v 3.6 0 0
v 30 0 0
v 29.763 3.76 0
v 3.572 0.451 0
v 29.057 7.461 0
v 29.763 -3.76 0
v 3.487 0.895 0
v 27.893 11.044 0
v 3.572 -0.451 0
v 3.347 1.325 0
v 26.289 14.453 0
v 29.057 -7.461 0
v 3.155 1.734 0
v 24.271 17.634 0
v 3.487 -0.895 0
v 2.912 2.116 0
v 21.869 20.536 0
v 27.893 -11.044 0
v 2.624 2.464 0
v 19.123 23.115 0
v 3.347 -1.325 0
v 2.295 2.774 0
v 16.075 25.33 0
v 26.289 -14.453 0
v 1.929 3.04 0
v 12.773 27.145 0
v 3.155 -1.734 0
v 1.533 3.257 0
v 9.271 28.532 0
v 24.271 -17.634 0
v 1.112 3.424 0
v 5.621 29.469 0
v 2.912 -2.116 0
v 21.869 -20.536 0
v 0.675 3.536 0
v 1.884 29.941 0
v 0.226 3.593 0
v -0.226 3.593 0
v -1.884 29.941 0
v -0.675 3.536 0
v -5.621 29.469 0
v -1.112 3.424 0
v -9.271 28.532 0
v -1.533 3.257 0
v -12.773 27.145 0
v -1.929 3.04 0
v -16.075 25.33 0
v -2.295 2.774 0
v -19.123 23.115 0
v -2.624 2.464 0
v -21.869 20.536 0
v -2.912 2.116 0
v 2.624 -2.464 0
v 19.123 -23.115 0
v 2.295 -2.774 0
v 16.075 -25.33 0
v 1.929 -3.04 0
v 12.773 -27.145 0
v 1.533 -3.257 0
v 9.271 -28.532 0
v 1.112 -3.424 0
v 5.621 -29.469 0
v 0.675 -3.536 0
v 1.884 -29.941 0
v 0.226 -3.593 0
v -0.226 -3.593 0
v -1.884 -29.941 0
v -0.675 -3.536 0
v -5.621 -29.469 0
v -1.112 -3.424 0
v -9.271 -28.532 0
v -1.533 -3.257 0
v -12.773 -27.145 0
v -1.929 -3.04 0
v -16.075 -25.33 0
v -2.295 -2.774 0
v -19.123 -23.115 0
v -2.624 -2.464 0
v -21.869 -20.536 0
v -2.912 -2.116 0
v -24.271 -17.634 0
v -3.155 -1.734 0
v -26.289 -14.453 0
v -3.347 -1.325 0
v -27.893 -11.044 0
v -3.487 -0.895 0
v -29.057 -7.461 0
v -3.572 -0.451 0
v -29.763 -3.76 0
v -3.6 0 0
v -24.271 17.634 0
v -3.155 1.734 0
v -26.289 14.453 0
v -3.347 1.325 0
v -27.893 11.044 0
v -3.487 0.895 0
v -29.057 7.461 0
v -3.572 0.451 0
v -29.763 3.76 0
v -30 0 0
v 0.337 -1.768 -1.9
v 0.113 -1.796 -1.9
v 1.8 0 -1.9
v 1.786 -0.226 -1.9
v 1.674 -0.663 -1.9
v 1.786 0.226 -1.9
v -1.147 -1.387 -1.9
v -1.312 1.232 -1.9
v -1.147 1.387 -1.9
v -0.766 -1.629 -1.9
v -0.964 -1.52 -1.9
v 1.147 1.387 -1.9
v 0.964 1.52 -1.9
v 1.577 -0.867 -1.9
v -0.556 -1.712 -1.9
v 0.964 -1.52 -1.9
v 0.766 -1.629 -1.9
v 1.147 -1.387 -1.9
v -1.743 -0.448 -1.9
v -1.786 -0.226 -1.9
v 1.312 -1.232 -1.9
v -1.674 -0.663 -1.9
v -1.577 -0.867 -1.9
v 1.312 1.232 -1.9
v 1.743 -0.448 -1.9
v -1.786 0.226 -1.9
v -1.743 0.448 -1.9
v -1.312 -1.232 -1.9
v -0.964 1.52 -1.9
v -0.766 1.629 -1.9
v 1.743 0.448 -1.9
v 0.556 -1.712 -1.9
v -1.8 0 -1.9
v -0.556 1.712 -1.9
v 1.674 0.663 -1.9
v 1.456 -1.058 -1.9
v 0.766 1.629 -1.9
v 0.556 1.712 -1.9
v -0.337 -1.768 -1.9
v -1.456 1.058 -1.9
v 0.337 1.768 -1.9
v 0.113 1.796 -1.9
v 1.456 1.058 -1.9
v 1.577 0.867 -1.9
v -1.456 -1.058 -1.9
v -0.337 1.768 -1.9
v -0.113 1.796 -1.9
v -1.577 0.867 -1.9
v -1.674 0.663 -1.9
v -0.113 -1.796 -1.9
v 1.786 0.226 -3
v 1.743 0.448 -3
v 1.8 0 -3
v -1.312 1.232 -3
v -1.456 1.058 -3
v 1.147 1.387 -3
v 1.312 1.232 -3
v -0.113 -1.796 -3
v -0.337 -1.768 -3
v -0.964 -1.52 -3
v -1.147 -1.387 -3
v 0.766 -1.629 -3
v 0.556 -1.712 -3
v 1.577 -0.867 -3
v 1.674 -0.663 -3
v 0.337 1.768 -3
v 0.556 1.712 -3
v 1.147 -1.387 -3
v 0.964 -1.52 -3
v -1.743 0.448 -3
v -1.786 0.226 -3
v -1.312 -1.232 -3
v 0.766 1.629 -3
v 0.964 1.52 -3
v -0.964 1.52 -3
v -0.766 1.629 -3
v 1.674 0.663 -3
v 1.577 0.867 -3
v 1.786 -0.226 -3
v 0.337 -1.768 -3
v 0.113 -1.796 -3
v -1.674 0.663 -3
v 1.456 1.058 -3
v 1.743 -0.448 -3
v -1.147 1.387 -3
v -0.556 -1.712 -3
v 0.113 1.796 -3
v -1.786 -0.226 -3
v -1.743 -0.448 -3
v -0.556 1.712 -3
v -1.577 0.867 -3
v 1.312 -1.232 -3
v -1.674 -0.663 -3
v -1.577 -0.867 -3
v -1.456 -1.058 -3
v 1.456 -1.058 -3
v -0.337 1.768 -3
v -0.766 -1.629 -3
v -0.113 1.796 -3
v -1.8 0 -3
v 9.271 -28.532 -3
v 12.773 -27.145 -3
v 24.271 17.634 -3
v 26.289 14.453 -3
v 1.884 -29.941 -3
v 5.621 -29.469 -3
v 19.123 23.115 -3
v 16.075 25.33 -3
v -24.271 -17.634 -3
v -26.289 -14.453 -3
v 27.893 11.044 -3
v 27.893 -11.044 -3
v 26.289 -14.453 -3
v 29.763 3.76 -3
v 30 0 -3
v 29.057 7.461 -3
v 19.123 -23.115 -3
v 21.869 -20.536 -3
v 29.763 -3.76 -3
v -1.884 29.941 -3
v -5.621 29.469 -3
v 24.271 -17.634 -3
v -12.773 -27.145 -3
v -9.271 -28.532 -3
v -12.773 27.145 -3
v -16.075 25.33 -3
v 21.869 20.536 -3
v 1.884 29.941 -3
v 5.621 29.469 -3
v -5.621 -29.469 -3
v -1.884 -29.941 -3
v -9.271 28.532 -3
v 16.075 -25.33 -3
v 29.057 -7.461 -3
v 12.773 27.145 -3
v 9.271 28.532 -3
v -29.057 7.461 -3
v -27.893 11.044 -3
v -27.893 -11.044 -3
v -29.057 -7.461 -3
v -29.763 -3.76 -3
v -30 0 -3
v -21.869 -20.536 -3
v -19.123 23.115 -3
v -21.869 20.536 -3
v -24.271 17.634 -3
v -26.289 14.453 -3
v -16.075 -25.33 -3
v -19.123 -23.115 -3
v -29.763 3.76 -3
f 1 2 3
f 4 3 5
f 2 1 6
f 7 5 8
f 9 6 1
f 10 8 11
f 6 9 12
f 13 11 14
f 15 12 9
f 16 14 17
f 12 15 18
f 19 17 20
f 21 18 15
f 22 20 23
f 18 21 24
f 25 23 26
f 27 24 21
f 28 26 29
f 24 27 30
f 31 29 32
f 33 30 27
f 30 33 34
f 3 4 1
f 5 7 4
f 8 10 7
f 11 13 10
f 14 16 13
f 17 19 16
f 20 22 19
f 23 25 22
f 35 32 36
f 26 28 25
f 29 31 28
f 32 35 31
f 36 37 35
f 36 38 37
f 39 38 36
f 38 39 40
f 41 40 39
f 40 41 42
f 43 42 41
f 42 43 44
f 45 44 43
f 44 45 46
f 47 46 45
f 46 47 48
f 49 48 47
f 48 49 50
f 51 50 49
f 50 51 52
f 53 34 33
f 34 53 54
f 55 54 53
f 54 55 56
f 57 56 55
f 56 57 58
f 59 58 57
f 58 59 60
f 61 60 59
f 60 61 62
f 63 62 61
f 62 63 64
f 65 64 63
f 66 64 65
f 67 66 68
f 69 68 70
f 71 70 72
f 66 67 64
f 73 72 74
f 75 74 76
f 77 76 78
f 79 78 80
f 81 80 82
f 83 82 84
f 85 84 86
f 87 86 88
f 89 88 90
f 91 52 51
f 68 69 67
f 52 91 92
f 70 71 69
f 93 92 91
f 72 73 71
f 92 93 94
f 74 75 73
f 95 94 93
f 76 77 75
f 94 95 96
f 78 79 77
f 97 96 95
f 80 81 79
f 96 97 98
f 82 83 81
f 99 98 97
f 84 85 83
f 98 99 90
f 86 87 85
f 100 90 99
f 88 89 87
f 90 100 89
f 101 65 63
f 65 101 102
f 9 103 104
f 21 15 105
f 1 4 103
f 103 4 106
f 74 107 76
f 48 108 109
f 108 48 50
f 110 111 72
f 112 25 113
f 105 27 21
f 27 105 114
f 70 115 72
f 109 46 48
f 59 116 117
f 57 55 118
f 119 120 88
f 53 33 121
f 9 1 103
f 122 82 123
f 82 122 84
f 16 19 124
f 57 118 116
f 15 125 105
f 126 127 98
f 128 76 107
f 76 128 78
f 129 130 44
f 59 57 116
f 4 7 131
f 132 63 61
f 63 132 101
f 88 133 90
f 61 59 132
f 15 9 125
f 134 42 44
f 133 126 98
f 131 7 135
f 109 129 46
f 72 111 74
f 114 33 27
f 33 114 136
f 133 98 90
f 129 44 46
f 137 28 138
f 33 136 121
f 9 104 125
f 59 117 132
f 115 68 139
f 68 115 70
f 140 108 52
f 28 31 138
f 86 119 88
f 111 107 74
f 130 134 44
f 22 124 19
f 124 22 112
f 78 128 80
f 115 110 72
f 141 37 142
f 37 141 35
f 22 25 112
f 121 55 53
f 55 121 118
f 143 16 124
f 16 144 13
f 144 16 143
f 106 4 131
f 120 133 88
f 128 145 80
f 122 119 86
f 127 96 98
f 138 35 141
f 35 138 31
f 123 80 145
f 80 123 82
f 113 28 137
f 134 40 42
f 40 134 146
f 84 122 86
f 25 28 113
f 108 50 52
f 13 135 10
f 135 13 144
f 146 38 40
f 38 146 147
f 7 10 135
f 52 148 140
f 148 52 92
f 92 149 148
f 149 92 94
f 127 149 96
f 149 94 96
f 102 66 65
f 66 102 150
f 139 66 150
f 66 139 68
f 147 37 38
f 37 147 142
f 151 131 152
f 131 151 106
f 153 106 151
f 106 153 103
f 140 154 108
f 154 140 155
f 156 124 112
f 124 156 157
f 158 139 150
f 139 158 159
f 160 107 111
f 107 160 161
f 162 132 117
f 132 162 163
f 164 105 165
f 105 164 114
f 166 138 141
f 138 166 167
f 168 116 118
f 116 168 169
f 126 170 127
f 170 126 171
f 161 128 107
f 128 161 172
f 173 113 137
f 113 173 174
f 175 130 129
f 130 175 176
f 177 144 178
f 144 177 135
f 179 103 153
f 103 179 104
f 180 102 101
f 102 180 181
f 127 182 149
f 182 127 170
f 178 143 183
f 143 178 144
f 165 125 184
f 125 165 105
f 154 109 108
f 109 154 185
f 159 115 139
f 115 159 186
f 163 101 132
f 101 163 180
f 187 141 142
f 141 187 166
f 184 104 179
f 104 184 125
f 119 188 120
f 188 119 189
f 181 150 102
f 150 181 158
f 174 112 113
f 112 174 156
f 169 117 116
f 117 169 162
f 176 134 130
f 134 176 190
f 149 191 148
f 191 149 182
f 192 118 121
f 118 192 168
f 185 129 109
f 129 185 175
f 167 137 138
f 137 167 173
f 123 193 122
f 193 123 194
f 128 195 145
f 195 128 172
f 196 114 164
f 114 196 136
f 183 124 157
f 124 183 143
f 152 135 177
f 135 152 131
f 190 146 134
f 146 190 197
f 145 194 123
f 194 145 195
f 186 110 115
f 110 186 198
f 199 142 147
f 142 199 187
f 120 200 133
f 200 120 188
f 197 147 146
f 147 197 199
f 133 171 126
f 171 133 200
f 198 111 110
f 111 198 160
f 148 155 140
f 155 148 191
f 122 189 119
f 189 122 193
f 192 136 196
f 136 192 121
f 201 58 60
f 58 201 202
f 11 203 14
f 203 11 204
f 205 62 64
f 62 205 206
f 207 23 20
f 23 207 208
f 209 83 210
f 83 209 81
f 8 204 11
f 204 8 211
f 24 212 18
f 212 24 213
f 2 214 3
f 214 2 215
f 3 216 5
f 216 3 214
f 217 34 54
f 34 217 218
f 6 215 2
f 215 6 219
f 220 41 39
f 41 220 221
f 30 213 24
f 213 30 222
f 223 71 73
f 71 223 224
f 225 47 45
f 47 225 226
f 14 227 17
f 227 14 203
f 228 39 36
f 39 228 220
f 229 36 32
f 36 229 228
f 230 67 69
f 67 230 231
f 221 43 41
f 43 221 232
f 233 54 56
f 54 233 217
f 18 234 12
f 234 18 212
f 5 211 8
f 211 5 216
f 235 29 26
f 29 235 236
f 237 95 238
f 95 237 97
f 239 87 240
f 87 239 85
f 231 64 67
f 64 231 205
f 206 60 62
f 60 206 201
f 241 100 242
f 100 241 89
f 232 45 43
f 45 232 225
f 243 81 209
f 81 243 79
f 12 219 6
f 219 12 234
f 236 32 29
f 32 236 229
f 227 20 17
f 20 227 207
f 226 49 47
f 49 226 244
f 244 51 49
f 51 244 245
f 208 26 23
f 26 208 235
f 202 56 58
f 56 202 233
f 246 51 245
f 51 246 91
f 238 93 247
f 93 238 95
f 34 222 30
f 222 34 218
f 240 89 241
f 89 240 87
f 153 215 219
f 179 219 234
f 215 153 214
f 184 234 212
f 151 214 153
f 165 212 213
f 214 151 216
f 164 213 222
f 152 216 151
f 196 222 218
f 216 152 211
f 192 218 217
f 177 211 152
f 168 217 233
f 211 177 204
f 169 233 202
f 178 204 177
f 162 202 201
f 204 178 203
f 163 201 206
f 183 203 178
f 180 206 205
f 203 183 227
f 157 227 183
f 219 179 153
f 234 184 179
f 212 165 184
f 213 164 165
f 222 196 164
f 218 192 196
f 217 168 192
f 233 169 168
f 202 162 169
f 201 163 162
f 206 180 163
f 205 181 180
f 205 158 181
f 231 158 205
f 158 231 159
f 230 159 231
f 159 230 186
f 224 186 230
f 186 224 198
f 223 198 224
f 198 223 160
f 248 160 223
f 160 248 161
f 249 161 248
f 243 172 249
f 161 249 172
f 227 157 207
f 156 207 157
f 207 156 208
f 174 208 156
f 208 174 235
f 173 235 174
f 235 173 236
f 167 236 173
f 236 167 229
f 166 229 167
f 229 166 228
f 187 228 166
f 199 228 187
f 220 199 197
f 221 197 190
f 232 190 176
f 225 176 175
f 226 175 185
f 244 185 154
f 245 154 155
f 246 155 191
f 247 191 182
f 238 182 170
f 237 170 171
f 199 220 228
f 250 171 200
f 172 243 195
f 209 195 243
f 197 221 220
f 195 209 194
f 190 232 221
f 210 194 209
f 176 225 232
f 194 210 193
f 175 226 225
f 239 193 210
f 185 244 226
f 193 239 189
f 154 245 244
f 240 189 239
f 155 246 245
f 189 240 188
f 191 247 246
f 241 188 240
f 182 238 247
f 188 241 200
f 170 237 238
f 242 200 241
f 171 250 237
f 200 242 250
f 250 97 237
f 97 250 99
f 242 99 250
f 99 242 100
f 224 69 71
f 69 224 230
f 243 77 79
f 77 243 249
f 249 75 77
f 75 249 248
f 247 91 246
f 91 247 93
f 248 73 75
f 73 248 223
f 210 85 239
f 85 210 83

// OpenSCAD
$fn = 50;

difference() {
	union() {
		translate(v = [0, 0, -3.0]) {
			cylinder(h = 3, r = 30.0);
		}
	}
	union() {
		translate(v = [0, 0, 0]) {
			rotate(a = [0, 0, 0]) {
				difference() {
					union() {
						translate(v = [0, 0, -6.0]) {
							cylinder(h = 6, r = 1.5);
						}
						translate(v = [0, 0, -1.9]) {
							cylinder(h = 1.9, r1 = 1.8, r2 = 3.6);
						}
						translate(v = [0, 0, -6.0]) {
							cylinder(h = 6, r = 1.8);
						}
						translate(v = [0, 0, -6.0]) {
							cylinder(h = 6, r = 1.5);
						}
					}
					union();
				}
			}
		}
	}
}
